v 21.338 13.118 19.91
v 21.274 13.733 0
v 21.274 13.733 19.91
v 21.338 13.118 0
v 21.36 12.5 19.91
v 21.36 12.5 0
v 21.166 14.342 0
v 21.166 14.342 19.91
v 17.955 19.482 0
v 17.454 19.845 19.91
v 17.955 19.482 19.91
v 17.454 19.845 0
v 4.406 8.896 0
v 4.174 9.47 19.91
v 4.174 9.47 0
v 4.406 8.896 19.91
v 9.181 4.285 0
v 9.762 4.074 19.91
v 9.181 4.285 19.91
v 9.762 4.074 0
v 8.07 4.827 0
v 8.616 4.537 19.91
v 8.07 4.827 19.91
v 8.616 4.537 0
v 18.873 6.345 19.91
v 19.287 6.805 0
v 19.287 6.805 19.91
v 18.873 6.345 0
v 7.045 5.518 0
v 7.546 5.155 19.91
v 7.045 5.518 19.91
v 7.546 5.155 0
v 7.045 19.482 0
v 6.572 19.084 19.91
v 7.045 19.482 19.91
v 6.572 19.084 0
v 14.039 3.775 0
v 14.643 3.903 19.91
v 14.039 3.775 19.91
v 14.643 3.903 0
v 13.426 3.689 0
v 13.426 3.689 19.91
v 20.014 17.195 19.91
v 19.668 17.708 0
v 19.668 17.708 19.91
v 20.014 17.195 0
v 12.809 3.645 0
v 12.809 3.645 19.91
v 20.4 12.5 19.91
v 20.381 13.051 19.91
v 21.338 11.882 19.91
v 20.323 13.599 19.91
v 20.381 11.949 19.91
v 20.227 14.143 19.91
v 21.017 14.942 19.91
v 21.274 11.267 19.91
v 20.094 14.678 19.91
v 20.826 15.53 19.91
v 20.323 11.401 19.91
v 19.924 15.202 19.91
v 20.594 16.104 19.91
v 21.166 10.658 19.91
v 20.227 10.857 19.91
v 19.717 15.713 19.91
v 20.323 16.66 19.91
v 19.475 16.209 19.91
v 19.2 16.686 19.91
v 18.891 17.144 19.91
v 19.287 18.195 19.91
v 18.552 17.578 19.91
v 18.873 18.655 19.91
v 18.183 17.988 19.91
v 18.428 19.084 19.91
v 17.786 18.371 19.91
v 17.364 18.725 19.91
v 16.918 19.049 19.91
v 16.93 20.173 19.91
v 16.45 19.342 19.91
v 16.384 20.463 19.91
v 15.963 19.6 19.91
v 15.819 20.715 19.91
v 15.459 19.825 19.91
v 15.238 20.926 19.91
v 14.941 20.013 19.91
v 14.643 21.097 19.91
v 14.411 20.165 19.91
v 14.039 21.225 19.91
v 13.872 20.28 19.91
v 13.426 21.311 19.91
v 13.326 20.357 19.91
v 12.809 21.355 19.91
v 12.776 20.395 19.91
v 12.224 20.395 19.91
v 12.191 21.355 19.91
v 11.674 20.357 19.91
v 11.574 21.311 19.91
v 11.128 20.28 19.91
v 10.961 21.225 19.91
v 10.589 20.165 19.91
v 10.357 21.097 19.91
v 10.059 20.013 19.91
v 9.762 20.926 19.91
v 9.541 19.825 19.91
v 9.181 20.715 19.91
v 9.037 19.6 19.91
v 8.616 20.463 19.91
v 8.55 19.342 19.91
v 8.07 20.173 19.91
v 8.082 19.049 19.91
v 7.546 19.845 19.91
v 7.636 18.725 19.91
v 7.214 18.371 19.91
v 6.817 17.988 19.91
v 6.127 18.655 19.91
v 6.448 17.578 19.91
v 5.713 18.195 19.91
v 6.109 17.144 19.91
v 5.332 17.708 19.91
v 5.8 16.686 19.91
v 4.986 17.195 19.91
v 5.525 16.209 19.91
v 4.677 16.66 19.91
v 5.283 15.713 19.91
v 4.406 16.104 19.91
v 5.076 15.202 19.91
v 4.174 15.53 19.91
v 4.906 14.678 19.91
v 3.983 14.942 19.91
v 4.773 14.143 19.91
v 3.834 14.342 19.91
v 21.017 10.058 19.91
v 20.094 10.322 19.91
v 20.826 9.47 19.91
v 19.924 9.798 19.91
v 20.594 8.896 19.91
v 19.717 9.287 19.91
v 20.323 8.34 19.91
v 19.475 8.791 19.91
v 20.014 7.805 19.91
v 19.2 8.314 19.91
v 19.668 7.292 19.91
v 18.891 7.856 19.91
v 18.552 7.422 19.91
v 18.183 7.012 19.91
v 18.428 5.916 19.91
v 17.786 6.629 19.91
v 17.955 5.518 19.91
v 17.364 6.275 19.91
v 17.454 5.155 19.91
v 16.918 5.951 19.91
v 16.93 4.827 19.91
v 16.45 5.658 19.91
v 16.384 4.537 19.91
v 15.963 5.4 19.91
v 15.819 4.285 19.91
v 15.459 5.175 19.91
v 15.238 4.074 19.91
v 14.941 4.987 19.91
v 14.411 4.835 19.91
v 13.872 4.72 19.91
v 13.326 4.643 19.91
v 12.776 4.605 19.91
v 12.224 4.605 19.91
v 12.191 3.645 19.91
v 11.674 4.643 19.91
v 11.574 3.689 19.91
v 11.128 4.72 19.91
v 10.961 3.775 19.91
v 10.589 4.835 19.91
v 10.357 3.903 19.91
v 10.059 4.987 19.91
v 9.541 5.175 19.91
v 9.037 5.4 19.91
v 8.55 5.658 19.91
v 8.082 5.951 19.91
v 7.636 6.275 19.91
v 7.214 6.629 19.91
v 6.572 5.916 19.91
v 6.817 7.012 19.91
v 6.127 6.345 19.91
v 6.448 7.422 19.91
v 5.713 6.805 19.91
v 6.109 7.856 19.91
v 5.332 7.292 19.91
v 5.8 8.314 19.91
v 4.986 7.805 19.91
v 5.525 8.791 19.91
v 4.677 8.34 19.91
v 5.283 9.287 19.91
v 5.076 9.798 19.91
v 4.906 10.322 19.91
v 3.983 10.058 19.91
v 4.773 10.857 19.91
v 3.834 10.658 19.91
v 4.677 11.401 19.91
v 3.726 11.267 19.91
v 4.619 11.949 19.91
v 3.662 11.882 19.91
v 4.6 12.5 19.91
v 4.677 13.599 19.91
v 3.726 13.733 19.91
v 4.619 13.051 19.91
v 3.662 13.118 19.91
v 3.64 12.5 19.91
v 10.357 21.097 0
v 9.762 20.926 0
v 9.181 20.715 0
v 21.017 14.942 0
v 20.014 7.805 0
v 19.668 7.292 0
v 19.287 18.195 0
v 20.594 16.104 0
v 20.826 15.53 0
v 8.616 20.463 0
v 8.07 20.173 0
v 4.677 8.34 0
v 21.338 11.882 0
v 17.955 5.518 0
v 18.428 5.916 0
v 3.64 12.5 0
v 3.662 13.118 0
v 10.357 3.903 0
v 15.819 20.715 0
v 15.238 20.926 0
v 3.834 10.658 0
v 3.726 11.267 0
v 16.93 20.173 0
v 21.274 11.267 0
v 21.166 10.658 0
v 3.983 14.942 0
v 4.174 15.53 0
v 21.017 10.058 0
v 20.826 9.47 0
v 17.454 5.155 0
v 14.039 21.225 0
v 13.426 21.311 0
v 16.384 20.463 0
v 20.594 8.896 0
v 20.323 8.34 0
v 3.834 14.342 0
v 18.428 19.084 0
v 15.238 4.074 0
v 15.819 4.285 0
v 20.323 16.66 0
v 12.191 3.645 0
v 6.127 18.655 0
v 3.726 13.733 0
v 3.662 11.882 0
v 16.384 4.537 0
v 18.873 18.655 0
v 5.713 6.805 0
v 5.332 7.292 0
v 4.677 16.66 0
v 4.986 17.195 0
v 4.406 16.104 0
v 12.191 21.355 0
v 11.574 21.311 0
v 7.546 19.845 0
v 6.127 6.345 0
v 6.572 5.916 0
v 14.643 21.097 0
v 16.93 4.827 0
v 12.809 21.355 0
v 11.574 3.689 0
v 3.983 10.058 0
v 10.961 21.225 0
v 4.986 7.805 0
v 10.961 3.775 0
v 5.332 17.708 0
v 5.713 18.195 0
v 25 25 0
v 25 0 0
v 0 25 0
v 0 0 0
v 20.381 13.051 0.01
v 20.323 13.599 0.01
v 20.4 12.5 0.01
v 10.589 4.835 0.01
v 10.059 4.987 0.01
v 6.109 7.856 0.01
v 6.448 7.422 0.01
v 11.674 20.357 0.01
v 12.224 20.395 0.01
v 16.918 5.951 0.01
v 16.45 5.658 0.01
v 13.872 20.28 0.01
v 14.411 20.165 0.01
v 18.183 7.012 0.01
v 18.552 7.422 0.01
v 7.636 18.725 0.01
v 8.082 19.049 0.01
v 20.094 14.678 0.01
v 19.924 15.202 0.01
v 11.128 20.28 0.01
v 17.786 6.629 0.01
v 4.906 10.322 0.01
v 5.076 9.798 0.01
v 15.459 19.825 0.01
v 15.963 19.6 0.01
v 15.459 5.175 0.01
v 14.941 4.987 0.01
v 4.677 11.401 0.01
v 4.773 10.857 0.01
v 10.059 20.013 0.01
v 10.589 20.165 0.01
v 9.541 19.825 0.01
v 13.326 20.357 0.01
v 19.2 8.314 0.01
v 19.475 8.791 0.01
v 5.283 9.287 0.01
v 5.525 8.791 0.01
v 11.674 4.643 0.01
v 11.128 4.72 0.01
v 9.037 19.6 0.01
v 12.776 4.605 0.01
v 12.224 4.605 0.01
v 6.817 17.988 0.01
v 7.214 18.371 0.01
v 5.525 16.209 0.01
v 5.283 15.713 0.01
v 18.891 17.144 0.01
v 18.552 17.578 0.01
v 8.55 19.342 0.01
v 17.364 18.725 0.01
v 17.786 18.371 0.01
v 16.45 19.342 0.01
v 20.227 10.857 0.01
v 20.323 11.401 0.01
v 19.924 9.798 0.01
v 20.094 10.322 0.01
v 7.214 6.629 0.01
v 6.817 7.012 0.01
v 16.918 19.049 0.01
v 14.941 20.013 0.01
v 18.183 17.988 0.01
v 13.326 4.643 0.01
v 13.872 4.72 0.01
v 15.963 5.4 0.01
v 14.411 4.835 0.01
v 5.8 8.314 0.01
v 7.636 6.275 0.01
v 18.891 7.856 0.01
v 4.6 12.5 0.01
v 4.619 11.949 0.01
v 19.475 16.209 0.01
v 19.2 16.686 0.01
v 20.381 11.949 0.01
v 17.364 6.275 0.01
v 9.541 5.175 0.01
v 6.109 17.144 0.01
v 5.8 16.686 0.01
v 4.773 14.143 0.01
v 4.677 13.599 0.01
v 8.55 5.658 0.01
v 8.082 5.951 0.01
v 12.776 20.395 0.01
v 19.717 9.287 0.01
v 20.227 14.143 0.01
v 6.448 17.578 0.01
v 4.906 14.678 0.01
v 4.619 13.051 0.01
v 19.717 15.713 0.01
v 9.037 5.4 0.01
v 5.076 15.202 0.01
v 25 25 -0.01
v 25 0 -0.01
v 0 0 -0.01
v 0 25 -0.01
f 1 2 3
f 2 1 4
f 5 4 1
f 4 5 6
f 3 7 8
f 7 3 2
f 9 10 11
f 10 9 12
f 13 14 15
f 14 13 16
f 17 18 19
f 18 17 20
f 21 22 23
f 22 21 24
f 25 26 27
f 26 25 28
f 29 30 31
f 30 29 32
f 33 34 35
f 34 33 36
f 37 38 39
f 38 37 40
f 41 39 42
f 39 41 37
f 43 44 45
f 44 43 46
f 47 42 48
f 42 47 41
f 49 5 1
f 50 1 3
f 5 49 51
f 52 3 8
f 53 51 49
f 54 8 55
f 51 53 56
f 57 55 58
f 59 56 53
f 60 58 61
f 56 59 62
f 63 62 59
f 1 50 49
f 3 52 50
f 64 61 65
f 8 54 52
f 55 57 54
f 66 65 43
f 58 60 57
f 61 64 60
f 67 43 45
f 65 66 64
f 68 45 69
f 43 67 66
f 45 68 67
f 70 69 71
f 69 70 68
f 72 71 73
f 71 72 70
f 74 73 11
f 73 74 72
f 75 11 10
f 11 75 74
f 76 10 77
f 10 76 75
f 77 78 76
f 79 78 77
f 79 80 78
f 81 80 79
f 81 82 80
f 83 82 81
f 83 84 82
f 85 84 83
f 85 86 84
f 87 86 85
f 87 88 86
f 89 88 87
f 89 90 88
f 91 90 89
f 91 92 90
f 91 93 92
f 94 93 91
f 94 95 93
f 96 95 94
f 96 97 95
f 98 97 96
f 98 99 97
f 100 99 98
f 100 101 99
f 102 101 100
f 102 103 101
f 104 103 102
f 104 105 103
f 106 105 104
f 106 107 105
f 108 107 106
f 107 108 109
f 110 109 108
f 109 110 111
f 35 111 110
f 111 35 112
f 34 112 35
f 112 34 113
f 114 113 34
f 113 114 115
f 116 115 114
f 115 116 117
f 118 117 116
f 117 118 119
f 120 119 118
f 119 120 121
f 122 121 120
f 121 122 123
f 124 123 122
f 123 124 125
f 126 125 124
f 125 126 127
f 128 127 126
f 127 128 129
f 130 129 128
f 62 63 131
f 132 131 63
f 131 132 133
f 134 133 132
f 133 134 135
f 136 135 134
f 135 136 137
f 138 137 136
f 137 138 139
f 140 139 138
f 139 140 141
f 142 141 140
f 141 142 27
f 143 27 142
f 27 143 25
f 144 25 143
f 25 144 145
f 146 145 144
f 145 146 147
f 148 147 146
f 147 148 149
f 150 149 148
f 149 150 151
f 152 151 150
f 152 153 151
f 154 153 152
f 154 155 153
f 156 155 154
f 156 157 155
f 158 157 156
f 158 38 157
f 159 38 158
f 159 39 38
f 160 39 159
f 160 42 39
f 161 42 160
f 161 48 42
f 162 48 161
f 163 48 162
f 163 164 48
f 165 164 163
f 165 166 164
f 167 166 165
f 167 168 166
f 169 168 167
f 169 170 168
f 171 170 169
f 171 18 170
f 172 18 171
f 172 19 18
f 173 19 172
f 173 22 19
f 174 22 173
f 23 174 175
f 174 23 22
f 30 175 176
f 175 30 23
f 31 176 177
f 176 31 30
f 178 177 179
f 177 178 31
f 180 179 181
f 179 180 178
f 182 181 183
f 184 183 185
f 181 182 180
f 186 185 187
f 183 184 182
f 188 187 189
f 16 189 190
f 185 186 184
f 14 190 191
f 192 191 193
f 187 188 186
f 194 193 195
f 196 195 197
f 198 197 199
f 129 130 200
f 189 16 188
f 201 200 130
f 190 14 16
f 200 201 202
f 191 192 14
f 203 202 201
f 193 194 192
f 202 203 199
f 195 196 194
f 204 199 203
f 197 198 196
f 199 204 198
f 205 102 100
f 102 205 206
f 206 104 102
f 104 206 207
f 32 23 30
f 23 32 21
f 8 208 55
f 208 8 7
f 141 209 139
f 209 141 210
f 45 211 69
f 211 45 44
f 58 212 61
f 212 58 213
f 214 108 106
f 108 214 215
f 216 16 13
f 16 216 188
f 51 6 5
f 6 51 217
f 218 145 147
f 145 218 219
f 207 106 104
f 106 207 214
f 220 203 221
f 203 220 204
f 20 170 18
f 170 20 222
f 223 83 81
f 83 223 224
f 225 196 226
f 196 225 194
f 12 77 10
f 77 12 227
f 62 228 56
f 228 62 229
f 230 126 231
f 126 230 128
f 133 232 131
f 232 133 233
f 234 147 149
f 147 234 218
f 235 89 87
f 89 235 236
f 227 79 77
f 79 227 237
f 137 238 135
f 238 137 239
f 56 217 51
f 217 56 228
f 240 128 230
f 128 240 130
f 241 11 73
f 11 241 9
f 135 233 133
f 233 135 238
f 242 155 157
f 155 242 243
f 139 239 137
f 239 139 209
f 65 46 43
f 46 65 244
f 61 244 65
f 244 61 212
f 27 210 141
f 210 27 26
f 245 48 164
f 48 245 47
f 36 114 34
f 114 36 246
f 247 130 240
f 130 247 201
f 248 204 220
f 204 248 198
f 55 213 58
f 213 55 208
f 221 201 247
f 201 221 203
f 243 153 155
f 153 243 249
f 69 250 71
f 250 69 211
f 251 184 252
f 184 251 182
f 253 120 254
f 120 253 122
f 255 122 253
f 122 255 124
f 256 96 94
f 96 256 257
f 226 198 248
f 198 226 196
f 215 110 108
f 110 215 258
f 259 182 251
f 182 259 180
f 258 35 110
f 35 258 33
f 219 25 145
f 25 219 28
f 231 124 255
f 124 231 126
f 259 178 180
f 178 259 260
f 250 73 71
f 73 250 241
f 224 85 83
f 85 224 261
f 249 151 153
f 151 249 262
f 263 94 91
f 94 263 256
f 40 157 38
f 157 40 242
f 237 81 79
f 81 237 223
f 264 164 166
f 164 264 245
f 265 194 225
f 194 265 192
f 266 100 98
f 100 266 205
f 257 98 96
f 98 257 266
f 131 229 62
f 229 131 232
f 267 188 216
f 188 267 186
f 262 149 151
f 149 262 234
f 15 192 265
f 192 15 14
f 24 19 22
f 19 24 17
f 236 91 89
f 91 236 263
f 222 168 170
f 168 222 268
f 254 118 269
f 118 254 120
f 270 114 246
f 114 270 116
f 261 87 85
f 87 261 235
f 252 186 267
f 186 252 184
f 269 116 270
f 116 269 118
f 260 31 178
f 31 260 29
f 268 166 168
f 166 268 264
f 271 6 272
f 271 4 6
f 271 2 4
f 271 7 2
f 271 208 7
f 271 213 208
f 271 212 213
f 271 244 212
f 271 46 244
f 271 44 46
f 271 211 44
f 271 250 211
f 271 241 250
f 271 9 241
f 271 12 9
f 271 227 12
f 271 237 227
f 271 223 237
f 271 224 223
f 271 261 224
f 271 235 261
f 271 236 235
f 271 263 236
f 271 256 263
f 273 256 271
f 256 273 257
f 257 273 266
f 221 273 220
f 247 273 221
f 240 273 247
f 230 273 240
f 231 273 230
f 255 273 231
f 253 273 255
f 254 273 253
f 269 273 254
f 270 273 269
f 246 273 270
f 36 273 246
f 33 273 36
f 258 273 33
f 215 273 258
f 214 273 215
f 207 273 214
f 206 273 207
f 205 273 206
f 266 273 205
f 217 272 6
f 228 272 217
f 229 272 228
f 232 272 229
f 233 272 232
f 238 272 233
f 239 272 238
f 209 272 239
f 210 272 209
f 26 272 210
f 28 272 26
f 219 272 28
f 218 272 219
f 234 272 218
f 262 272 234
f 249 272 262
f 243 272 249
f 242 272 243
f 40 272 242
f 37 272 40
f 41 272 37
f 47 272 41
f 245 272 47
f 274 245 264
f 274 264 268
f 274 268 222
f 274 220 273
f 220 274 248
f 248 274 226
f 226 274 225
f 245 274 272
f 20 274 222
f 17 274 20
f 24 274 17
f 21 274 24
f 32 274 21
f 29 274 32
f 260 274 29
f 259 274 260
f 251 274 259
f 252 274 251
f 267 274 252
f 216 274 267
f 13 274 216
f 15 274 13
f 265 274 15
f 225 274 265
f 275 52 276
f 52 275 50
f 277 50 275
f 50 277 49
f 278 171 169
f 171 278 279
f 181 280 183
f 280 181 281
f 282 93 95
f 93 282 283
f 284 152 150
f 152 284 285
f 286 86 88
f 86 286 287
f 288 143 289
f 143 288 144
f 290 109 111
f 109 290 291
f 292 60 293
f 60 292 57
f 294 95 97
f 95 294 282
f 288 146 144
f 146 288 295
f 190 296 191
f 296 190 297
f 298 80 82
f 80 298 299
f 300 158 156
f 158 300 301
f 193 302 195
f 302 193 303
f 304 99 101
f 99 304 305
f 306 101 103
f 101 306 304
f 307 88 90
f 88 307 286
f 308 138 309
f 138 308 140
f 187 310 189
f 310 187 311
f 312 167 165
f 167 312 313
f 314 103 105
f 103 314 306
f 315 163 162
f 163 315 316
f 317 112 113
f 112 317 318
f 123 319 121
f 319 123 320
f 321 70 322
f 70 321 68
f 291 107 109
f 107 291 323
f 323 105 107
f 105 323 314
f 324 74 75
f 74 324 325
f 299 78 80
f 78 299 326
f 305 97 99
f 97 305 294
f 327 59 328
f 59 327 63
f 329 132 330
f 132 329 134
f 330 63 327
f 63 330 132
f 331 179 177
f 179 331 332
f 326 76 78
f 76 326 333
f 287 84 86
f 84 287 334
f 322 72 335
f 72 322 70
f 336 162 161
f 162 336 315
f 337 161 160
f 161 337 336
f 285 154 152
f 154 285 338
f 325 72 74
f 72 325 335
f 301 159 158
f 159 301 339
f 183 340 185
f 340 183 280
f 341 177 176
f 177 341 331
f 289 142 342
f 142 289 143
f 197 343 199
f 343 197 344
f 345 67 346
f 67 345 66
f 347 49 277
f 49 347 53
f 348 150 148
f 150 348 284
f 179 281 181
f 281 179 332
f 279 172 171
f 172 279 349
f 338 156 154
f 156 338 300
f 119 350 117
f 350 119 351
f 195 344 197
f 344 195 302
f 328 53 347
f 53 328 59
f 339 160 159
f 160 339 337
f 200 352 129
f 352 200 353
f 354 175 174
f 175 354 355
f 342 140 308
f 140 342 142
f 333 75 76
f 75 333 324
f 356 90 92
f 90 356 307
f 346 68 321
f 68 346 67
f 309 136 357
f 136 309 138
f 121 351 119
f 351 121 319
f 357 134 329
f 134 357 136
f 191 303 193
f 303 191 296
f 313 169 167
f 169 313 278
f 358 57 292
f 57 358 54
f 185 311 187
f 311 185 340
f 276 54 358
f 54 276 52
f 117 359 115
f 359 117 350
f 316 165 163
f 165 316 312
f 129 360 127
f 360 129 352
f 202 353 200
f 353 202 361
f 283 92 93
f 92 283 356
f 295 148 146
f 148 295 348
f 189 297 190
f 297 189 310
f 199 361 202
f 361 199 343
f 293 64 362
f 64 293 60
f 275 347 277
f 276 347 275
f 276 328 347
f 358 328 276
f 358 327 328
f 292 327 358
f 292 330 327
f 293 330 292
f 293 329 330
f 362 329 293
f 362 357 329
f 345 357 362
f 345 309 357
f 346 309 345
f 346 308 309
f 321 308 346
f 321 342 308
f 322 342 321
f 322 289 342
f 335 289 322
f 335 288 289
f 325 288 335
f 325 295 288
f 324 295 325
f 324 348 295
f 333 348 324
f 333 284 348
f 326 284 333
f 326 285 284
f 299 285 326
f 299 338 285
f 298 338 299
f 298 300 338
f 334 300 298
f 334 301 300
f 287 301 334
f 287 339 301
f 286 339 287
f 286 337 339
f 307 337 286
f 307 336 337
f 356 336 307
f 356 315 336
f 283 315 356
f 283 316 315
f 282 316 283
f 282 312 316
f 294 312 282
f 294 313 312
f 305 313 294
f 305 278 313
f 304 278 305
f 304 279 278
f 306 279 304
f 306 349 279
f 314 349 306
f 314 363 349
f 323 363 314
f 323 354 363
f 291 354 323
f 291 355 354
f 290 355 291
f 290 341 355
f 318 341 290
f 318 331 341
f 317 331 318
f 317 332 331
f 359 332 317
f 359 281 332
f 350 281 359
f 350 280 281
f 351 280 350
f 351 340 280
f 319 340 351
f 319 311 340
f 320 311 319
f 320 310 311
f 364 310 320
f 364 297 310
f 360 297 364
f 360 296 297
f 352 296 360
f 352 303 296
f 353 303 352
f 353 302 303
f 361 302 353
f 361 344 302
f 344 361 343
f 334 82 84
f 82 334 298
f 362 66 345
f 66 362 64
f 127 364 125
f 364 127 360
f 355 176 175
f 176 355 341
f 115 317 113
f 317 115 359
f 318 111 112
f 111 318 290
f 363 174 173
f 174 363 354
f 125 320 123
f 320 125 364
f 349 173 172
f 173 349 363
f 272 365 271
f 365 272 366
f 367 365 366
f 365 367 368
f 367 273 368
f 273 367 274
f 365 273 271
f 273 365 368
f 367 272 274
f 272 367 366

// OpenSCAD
// file: ../Base/PlacementOptions.scad
// Fischertechnik Box Foundation
// Placement Options

// Alignment
NoAlign = 0;
AlignLeft = 1;
AlignBottom = 2;
AlignCenter = 3;
AlignRight = 4;
AlignTop = 5;

// Element rotation degree steps
rotations = [0, -90, -180, -270];

// Rotation
NoRotation = 0;
Rotate0 = 0;
Rotate90 = 1;
Rotate180 = 2;
Rotate270 = 3;

// Docking (seen from above)
NoDock = -1;
DockLeft = 0;
DockTop = 1;
DockRight = 2;
DockCorner = 2;
DockBottom = 3;

// Web corners
LowerLeft = 0;
UpperLeft = 1;
UpperRight = 2;
LowerRight = 3;

// Web position relative to corner
LeftOfCorner = 0;
RightOfCorner = 1;
// file: ../Base/Boxes.scad
// Fischertechnik Box Foundation
// Pre-designed Boxes

use <Constants.scad>

include <PlacementOptions.scad>

box190Width = 190;
box190Depth = 130;
box130Width = 130;
box130Depth = 95;
boxUsageHeight = 33.9;
boxWallThickness = 2.4;
boxBaseThickness = 1.0;
boxWebWidth = 3.0;

// getBoxWallThickness()
// Gets the wall thickness of a Fischertechnik Box

function getBoxWallThickness() = boxWallThickness;

// Gets the usable height of a fischertechnik box
function getBoxUsageHeight() = boxUsageHeight;

// Gets the thickness of the Fischertechnik box base.
function getBoxBaseThickness() = boxBaseThickness;

// Gets the width of a box web
function getBoxWebWidth() = boxWebWidth;

// Gets the usable inner space of a Box 190 as an x/y-list
function getBox190Space() = [
    box190Width - 2*getBoxWallThickness(), 
    box190Depth - 2*getBoxWallThickness() ];

// Imports the Fischertechnik empty box 130x190 mm and places it at position 0,0
// 190x130 are the outer sizes, the inner space is slightly smaller. Use getBox190Space() to get the inner sizes.
// This module needs the STL file "Fischertechnik Box 130x190.stl" in the library path.
// The box is positioned that the usable inner space is at the 0,0,0 position. The

module Box190() {
    translate([-getBoxWallThickness(),-getBoxWallThickness(),-getBoxBaseThickness()])
        import("Fischertechnik Box 130x190.stl", convexity=3);
}

// Gets the usable inner space of a Box 130 as an x/y-list
function getBox130Space() = [
    box130Width - 2*getBoxWallThickness(), 
    box130Depth - 2*getBoxWallThickness() ];

// Imports the Fischertechnik empty box 95x130 mm and places it at position 0,0
// 190x130 are the outer sizes, the inner space is slightly smaller. Use getBox190Space() to get the inner sizes.
// This module needs the STL file "Fischertechnik Box 95x130.stl" in the library path.
// The box is positioned that the usable inner space is at the 0,0,0 position. The

module Box130() {
    translate([-getBoxWallThickness(),-getBoxWallThickness(),-getBoxBaseThickness()])
        import("Fischertechnik Box 95x130.stl", convexity=3);
}

// Creates a web at the specified box walls
// corner 0 = LowerLeft, 1 = UpperLeft, 2 = UpperRight, 3 = LowerRight
// side 0 = LeftOfCorner, 1 = RightOfCorner
// distance = Distance in mm from the corner
// box = inner width and depth of the box (default: Box 190)
// webWidth = length of the web (default is 3 mms)
// webThickness = thickness of the web (default is 1 mm)

module BoxWeb(corner, side, distance, box=getBox190Space(), webWidth=getBoxWebWidth(), webThickness=1.0) {
    sink = getBoxWallThickness()/2;

    width = (corner % 2 == 0) ? 
            (side == LeftOfCorner ? webWidth : webThickness) :
            (side == LeftOfCorner ? webThickness : webWidth);

    depth = (corner % 2 == 0) ? 
            (side == RightOfCorner ? webWidth : webThickness) :
            (side == RightOfCorner ? webThickness : webWidth);
    
    xDiff = corner == LowerLeft ? 
                (side == LeftOfCorner ? -sink : distance) :
            (corner == UpperLeft ?                
                (side == LeftOfCorner ? distance : -sink) :
            (corner == UpperRight ?
                (side == LeftOfCorner ? box.x-webWidth+sink : box.x-distance-webThickness) :
                (side == LeftOfCorner ? box.x-distance-webThickness: box.x-webWidth+sink)));

    yDiff = corner == LowerLeft ? 
                (side == RightOfCorner ? -sink : distance) :
            (corner == UpperLeft ?
                (side == RightOfCorner ? box.y-distance : box.y-webWidth+sink) :
            (corner == UpperRight ?
                (side == RightOfCorner ? box.y-webWidth+sink : box.y-distance) :
                (side == RightOfCorner ? distance : -sink)));
    
    translate([xDiff, yDiff, -getExcess()])
        cube([width, depth, boxUsageHeight + 2*getExcess()]);
}
// file: ../Base/Rotation.scad
// Fischertechnik Box Foundation
// Geometry Helpers Rotation

include <PlacementOptions.scad>

// getRotatedSpace(space, rotation=NoRotation)
// Rotates the space dependent on the specified rotation

function getRotatedSpace(space, rotation=NoRotation) = [
    (rotation == Rotate90 || rotation == Rotate270) ? space.y : space.x,
    (rotation == Rotate90 || rotation == Rotate270) ? space.x : space.y
];

// Rotates the given space around the fixed left lower corner
// space = the space the children needs as width/depth list [width,depth]
// rotation = 0 Rotate0 degrees, 1 Rotate90 degrees, 2 Rotate180 degrees, 3 Rotate270 degrees (equivalent to -90)

module RotateFix(space, rotation=Rotate0) {
    dy = (rotation == Rotate0 || rotation == Rotate270) ? 0 :
        (rotation == Rotate90) ? space.x :
        space.y;
    dx = (rotation < Rotate180) ? 0 :
        (rotation == Rotate180) ? space.x :
        space.y;
    
    translate([dx, dy, 0])
        rotate([0, 0, rotations[rotation]])
            children();
}
// file: ../Base/Alignment.scad
// Fischertechnik Box Foundation
// Geometry Helpers Alignment

include <PlacementOptions.scad>

// getAlignedX(elementWidth, spaceWidth, align=AlignRight, offset=0)
// Gets the aligned X offset of an element with the given
// width in the given space.
// elementWidth = The width of the element to positon
// spaceWidth = The space where the element should be aligned
// align = 0 AlignLeft, 1 AlignCenter, 2 AlignRight
// offset = an optional offset from the aligned position. When
// aligned left or centered, then positive values are in X direction.
// When aligned right then positive values are in negative X direction.

function getAlignedX(elementWidth, spaceWidth, align=AlignRight, offset=0) =
    (align == AlignLeft) ?
        offset :
        ((align == AlignCenter) ?
        (spaceWidth - elementWidth)/2 + offset :
        spaceWidth - offset - elementWidth);

// getAlignedY(elementDepth, spaceDepth, align=AlignTop, offset=0)
// Gets the aligned Y offset of an element with the given
// depth in the given space.
// elementDepth = The depth of the element to positon
// spaceDepth = The space where the element should be aligned
// align = 0 AlignBottom, 1 AlignCenter, 2 AlignTop
// offset = an optional offset from the aligned position. When
// aligned bottom or centered, then positive values are in Y direction.
// When aligned top then positive values are in negative Y direction.

function getAlignedY(elementDepth, spaceDepth, align=AlignTop, offset=0) =
    (align == AlignBottom) ?
        offset :
        ((align == AlignCenter) ?
        (spaceDepth - elementDepth)/2 + offset :
        spaceDepth - offset - elementDepth);
// file: ../Base/Placement.scad
// Fischertechnik Box Foundation
// Geometry Helpers Placement

use <Constants.scad>
use <Alignment.scad>
use <Rotation.scad>
use <Boxes.scad>

include <PlacementOptions.scad>

// Place(x=0, y=0, elementSpace=[0,0], alignX=AlignLeft, alignY=AlignBottom, rotation=Rotate0, boxSpace=getBox190Space())
// Places the child at the specified position
// y = Y-Position. This is a relative position when an X aligment is specified.
// x = X-Position. This is a relative position when an Y aligment is specified.
// elementSpace = space of the element to be placed [x,y]
// alignX = -1=NoAlign, 0 AlignLeft, 1 AlignCenter, 3 AlignRight (elementSpace and boxSpace required!)
// alignY = -1=NoAlign, 2 AlignBottom, 1 AlignCenter, 4 AlignTop (elementSpace and boxSpace required!)
// rotation = 0 Rotate0 0 degrees, 1 Rotate90 90 degrees, 
// 2 Rotate180 180 degrees, 3 Rotate270 270 degrees (equivalent to -90)
// boxSpace = Inner space of the box where the placement occurs [x,y] - default is Box 190x130 inner space

module Place(x=0, y=0, elementSpace=[0,0], 
  alignX=AlignLeft, alignY=AlignBottom, 
  rotation=NoRotation, boxSpace=getBox190Space()) {

    module Position(x, y, space, rotation=Rotate0) {
        translate([x, y, 0])
            RotateFix(space, rotation)
                children();
    }

    space = getRotatedSpace(elementSpace, rotation);
    alignedX = getAlignedX(space.x, boxSpace.x, alignX, x);
    alignedY = getAlignedY(space.y, boxSpace.y, alignY, y);
    Position(alignedX, alignedY, elementSpace, rotation)
        children();
}

// Center(space=getBox130Space(), elementSpace=[0,0])
// space = Space where the children is centered. For cylinder use centered=true and no elementSpace.
// elementSpace = space of the element to be centered [x,y]

module Center(space=getBox190Space(), elementSpace=[0,0]) {
    translate([(space.x - elementSpace.x) / 2, (space.y - elementSpace.y) / 2])
        children(0);
}

// CenterHorizontal(width=0, y=0, offset=0, space=getBox130Space())
// space = Space where the children is centered. For cylinder use centered=true and no elementSpace.
// elementSpace = space of the element to be centered [x,y]

module CenterHorizontal(width=0, y=0, offset=0, space=getBox190Space()) {
    translate([(space.x - width) / 2 + offset, y])
        children(0);
}

// CenterVertical(depth=0, x=0, offset=0, space=getBox130Space())
// space = Space where the children is centered. For cylinder use centered=true and no elementSpace.
// elementSpace = space of the element to be centered [x,y]

module CenterVertical(depth=0, x=0, offset=0, space=getBox190Space()) {
    translate([x, (space.y - depth) / 2 + offset])
        children(0);
}
// file: ../Base/Constants.scad
// Fischertechnik Box Foundation
// Constants

// Constant values necessary for multiple elements

// Base constants
dividerThickness = 1.2;
excess = 0.01;
fragments = 90;
tolerance = 0.8;

// Gets the thickness of a divider 
function getDividerThickness() = dividerThickness;

// Gets the excess that is used to merge walls into each other
function getExcess() = excess;

// Gets amount of fragments of a cylinder
function getFragments() = fragments;

// Gets the inner tolerance of a frame to each side
function getTolerance() = tolerance;


// Fischertechnik specific constants
axisDiameter = 4;
axisBottomDiameter = axisDiameter + 1;
standardEdgeDistance = 2.5;
standardWebDistance = 11.5;
standardCornerLength = 15;
tubeWallFactor = 0.8;

// Gets axis diameter
function getAxisDiameter() = axisDiameter;

// Gets axis bottom diameter for thicker part at the bottom
function getAxisBottomDiameter() = axisBottomDiameter;

// gets the standard distance to the wall of the box for dockable frames with webs
function getStandardEdgeDistance() = standardEdgeDistance;

// gets the standard distance of each web to the corner of the dockable frame
function getStandardWebDistance() = standardWebDistance;

// gets the standard length of the corner walls of a dockable frame
function getStandardCornerLength() = standardCornerLength;

// gets the wall thickness of a tube.
function getTubeWallThickness() = tubeWallFactor * getDividerThickness();
// main file
// Fischertechnik Box Library
// Cylinder for Wheel 23 with Axis 
// 36581, 35586

use <../Base/Constants.scad>
use <../Base/Placement.scad>
use <../ModelBase/Simple.scad>

width = 25;
depth = 25;

// getCylinderWheel23Space()
// Gets the space the cylinder wheel 23 needs as width and depth (.x and .y as a list)

function getCylinderWheel23Space() = [width, depth];

// CylinderWheel23()
// Standing cylinder for wheel 23 with axis.
// 36581, 35586

module CylinderWheel23() {
    diameter = 15.8;
    height = 19.9;

    Space(getCylinderWheel23Space());
    
    Center(getCylinderWheel23Space())
        Tube(height, innerDiameter=diameter);
}

// Tests
color("lightgray")
CylinderWheel23();
